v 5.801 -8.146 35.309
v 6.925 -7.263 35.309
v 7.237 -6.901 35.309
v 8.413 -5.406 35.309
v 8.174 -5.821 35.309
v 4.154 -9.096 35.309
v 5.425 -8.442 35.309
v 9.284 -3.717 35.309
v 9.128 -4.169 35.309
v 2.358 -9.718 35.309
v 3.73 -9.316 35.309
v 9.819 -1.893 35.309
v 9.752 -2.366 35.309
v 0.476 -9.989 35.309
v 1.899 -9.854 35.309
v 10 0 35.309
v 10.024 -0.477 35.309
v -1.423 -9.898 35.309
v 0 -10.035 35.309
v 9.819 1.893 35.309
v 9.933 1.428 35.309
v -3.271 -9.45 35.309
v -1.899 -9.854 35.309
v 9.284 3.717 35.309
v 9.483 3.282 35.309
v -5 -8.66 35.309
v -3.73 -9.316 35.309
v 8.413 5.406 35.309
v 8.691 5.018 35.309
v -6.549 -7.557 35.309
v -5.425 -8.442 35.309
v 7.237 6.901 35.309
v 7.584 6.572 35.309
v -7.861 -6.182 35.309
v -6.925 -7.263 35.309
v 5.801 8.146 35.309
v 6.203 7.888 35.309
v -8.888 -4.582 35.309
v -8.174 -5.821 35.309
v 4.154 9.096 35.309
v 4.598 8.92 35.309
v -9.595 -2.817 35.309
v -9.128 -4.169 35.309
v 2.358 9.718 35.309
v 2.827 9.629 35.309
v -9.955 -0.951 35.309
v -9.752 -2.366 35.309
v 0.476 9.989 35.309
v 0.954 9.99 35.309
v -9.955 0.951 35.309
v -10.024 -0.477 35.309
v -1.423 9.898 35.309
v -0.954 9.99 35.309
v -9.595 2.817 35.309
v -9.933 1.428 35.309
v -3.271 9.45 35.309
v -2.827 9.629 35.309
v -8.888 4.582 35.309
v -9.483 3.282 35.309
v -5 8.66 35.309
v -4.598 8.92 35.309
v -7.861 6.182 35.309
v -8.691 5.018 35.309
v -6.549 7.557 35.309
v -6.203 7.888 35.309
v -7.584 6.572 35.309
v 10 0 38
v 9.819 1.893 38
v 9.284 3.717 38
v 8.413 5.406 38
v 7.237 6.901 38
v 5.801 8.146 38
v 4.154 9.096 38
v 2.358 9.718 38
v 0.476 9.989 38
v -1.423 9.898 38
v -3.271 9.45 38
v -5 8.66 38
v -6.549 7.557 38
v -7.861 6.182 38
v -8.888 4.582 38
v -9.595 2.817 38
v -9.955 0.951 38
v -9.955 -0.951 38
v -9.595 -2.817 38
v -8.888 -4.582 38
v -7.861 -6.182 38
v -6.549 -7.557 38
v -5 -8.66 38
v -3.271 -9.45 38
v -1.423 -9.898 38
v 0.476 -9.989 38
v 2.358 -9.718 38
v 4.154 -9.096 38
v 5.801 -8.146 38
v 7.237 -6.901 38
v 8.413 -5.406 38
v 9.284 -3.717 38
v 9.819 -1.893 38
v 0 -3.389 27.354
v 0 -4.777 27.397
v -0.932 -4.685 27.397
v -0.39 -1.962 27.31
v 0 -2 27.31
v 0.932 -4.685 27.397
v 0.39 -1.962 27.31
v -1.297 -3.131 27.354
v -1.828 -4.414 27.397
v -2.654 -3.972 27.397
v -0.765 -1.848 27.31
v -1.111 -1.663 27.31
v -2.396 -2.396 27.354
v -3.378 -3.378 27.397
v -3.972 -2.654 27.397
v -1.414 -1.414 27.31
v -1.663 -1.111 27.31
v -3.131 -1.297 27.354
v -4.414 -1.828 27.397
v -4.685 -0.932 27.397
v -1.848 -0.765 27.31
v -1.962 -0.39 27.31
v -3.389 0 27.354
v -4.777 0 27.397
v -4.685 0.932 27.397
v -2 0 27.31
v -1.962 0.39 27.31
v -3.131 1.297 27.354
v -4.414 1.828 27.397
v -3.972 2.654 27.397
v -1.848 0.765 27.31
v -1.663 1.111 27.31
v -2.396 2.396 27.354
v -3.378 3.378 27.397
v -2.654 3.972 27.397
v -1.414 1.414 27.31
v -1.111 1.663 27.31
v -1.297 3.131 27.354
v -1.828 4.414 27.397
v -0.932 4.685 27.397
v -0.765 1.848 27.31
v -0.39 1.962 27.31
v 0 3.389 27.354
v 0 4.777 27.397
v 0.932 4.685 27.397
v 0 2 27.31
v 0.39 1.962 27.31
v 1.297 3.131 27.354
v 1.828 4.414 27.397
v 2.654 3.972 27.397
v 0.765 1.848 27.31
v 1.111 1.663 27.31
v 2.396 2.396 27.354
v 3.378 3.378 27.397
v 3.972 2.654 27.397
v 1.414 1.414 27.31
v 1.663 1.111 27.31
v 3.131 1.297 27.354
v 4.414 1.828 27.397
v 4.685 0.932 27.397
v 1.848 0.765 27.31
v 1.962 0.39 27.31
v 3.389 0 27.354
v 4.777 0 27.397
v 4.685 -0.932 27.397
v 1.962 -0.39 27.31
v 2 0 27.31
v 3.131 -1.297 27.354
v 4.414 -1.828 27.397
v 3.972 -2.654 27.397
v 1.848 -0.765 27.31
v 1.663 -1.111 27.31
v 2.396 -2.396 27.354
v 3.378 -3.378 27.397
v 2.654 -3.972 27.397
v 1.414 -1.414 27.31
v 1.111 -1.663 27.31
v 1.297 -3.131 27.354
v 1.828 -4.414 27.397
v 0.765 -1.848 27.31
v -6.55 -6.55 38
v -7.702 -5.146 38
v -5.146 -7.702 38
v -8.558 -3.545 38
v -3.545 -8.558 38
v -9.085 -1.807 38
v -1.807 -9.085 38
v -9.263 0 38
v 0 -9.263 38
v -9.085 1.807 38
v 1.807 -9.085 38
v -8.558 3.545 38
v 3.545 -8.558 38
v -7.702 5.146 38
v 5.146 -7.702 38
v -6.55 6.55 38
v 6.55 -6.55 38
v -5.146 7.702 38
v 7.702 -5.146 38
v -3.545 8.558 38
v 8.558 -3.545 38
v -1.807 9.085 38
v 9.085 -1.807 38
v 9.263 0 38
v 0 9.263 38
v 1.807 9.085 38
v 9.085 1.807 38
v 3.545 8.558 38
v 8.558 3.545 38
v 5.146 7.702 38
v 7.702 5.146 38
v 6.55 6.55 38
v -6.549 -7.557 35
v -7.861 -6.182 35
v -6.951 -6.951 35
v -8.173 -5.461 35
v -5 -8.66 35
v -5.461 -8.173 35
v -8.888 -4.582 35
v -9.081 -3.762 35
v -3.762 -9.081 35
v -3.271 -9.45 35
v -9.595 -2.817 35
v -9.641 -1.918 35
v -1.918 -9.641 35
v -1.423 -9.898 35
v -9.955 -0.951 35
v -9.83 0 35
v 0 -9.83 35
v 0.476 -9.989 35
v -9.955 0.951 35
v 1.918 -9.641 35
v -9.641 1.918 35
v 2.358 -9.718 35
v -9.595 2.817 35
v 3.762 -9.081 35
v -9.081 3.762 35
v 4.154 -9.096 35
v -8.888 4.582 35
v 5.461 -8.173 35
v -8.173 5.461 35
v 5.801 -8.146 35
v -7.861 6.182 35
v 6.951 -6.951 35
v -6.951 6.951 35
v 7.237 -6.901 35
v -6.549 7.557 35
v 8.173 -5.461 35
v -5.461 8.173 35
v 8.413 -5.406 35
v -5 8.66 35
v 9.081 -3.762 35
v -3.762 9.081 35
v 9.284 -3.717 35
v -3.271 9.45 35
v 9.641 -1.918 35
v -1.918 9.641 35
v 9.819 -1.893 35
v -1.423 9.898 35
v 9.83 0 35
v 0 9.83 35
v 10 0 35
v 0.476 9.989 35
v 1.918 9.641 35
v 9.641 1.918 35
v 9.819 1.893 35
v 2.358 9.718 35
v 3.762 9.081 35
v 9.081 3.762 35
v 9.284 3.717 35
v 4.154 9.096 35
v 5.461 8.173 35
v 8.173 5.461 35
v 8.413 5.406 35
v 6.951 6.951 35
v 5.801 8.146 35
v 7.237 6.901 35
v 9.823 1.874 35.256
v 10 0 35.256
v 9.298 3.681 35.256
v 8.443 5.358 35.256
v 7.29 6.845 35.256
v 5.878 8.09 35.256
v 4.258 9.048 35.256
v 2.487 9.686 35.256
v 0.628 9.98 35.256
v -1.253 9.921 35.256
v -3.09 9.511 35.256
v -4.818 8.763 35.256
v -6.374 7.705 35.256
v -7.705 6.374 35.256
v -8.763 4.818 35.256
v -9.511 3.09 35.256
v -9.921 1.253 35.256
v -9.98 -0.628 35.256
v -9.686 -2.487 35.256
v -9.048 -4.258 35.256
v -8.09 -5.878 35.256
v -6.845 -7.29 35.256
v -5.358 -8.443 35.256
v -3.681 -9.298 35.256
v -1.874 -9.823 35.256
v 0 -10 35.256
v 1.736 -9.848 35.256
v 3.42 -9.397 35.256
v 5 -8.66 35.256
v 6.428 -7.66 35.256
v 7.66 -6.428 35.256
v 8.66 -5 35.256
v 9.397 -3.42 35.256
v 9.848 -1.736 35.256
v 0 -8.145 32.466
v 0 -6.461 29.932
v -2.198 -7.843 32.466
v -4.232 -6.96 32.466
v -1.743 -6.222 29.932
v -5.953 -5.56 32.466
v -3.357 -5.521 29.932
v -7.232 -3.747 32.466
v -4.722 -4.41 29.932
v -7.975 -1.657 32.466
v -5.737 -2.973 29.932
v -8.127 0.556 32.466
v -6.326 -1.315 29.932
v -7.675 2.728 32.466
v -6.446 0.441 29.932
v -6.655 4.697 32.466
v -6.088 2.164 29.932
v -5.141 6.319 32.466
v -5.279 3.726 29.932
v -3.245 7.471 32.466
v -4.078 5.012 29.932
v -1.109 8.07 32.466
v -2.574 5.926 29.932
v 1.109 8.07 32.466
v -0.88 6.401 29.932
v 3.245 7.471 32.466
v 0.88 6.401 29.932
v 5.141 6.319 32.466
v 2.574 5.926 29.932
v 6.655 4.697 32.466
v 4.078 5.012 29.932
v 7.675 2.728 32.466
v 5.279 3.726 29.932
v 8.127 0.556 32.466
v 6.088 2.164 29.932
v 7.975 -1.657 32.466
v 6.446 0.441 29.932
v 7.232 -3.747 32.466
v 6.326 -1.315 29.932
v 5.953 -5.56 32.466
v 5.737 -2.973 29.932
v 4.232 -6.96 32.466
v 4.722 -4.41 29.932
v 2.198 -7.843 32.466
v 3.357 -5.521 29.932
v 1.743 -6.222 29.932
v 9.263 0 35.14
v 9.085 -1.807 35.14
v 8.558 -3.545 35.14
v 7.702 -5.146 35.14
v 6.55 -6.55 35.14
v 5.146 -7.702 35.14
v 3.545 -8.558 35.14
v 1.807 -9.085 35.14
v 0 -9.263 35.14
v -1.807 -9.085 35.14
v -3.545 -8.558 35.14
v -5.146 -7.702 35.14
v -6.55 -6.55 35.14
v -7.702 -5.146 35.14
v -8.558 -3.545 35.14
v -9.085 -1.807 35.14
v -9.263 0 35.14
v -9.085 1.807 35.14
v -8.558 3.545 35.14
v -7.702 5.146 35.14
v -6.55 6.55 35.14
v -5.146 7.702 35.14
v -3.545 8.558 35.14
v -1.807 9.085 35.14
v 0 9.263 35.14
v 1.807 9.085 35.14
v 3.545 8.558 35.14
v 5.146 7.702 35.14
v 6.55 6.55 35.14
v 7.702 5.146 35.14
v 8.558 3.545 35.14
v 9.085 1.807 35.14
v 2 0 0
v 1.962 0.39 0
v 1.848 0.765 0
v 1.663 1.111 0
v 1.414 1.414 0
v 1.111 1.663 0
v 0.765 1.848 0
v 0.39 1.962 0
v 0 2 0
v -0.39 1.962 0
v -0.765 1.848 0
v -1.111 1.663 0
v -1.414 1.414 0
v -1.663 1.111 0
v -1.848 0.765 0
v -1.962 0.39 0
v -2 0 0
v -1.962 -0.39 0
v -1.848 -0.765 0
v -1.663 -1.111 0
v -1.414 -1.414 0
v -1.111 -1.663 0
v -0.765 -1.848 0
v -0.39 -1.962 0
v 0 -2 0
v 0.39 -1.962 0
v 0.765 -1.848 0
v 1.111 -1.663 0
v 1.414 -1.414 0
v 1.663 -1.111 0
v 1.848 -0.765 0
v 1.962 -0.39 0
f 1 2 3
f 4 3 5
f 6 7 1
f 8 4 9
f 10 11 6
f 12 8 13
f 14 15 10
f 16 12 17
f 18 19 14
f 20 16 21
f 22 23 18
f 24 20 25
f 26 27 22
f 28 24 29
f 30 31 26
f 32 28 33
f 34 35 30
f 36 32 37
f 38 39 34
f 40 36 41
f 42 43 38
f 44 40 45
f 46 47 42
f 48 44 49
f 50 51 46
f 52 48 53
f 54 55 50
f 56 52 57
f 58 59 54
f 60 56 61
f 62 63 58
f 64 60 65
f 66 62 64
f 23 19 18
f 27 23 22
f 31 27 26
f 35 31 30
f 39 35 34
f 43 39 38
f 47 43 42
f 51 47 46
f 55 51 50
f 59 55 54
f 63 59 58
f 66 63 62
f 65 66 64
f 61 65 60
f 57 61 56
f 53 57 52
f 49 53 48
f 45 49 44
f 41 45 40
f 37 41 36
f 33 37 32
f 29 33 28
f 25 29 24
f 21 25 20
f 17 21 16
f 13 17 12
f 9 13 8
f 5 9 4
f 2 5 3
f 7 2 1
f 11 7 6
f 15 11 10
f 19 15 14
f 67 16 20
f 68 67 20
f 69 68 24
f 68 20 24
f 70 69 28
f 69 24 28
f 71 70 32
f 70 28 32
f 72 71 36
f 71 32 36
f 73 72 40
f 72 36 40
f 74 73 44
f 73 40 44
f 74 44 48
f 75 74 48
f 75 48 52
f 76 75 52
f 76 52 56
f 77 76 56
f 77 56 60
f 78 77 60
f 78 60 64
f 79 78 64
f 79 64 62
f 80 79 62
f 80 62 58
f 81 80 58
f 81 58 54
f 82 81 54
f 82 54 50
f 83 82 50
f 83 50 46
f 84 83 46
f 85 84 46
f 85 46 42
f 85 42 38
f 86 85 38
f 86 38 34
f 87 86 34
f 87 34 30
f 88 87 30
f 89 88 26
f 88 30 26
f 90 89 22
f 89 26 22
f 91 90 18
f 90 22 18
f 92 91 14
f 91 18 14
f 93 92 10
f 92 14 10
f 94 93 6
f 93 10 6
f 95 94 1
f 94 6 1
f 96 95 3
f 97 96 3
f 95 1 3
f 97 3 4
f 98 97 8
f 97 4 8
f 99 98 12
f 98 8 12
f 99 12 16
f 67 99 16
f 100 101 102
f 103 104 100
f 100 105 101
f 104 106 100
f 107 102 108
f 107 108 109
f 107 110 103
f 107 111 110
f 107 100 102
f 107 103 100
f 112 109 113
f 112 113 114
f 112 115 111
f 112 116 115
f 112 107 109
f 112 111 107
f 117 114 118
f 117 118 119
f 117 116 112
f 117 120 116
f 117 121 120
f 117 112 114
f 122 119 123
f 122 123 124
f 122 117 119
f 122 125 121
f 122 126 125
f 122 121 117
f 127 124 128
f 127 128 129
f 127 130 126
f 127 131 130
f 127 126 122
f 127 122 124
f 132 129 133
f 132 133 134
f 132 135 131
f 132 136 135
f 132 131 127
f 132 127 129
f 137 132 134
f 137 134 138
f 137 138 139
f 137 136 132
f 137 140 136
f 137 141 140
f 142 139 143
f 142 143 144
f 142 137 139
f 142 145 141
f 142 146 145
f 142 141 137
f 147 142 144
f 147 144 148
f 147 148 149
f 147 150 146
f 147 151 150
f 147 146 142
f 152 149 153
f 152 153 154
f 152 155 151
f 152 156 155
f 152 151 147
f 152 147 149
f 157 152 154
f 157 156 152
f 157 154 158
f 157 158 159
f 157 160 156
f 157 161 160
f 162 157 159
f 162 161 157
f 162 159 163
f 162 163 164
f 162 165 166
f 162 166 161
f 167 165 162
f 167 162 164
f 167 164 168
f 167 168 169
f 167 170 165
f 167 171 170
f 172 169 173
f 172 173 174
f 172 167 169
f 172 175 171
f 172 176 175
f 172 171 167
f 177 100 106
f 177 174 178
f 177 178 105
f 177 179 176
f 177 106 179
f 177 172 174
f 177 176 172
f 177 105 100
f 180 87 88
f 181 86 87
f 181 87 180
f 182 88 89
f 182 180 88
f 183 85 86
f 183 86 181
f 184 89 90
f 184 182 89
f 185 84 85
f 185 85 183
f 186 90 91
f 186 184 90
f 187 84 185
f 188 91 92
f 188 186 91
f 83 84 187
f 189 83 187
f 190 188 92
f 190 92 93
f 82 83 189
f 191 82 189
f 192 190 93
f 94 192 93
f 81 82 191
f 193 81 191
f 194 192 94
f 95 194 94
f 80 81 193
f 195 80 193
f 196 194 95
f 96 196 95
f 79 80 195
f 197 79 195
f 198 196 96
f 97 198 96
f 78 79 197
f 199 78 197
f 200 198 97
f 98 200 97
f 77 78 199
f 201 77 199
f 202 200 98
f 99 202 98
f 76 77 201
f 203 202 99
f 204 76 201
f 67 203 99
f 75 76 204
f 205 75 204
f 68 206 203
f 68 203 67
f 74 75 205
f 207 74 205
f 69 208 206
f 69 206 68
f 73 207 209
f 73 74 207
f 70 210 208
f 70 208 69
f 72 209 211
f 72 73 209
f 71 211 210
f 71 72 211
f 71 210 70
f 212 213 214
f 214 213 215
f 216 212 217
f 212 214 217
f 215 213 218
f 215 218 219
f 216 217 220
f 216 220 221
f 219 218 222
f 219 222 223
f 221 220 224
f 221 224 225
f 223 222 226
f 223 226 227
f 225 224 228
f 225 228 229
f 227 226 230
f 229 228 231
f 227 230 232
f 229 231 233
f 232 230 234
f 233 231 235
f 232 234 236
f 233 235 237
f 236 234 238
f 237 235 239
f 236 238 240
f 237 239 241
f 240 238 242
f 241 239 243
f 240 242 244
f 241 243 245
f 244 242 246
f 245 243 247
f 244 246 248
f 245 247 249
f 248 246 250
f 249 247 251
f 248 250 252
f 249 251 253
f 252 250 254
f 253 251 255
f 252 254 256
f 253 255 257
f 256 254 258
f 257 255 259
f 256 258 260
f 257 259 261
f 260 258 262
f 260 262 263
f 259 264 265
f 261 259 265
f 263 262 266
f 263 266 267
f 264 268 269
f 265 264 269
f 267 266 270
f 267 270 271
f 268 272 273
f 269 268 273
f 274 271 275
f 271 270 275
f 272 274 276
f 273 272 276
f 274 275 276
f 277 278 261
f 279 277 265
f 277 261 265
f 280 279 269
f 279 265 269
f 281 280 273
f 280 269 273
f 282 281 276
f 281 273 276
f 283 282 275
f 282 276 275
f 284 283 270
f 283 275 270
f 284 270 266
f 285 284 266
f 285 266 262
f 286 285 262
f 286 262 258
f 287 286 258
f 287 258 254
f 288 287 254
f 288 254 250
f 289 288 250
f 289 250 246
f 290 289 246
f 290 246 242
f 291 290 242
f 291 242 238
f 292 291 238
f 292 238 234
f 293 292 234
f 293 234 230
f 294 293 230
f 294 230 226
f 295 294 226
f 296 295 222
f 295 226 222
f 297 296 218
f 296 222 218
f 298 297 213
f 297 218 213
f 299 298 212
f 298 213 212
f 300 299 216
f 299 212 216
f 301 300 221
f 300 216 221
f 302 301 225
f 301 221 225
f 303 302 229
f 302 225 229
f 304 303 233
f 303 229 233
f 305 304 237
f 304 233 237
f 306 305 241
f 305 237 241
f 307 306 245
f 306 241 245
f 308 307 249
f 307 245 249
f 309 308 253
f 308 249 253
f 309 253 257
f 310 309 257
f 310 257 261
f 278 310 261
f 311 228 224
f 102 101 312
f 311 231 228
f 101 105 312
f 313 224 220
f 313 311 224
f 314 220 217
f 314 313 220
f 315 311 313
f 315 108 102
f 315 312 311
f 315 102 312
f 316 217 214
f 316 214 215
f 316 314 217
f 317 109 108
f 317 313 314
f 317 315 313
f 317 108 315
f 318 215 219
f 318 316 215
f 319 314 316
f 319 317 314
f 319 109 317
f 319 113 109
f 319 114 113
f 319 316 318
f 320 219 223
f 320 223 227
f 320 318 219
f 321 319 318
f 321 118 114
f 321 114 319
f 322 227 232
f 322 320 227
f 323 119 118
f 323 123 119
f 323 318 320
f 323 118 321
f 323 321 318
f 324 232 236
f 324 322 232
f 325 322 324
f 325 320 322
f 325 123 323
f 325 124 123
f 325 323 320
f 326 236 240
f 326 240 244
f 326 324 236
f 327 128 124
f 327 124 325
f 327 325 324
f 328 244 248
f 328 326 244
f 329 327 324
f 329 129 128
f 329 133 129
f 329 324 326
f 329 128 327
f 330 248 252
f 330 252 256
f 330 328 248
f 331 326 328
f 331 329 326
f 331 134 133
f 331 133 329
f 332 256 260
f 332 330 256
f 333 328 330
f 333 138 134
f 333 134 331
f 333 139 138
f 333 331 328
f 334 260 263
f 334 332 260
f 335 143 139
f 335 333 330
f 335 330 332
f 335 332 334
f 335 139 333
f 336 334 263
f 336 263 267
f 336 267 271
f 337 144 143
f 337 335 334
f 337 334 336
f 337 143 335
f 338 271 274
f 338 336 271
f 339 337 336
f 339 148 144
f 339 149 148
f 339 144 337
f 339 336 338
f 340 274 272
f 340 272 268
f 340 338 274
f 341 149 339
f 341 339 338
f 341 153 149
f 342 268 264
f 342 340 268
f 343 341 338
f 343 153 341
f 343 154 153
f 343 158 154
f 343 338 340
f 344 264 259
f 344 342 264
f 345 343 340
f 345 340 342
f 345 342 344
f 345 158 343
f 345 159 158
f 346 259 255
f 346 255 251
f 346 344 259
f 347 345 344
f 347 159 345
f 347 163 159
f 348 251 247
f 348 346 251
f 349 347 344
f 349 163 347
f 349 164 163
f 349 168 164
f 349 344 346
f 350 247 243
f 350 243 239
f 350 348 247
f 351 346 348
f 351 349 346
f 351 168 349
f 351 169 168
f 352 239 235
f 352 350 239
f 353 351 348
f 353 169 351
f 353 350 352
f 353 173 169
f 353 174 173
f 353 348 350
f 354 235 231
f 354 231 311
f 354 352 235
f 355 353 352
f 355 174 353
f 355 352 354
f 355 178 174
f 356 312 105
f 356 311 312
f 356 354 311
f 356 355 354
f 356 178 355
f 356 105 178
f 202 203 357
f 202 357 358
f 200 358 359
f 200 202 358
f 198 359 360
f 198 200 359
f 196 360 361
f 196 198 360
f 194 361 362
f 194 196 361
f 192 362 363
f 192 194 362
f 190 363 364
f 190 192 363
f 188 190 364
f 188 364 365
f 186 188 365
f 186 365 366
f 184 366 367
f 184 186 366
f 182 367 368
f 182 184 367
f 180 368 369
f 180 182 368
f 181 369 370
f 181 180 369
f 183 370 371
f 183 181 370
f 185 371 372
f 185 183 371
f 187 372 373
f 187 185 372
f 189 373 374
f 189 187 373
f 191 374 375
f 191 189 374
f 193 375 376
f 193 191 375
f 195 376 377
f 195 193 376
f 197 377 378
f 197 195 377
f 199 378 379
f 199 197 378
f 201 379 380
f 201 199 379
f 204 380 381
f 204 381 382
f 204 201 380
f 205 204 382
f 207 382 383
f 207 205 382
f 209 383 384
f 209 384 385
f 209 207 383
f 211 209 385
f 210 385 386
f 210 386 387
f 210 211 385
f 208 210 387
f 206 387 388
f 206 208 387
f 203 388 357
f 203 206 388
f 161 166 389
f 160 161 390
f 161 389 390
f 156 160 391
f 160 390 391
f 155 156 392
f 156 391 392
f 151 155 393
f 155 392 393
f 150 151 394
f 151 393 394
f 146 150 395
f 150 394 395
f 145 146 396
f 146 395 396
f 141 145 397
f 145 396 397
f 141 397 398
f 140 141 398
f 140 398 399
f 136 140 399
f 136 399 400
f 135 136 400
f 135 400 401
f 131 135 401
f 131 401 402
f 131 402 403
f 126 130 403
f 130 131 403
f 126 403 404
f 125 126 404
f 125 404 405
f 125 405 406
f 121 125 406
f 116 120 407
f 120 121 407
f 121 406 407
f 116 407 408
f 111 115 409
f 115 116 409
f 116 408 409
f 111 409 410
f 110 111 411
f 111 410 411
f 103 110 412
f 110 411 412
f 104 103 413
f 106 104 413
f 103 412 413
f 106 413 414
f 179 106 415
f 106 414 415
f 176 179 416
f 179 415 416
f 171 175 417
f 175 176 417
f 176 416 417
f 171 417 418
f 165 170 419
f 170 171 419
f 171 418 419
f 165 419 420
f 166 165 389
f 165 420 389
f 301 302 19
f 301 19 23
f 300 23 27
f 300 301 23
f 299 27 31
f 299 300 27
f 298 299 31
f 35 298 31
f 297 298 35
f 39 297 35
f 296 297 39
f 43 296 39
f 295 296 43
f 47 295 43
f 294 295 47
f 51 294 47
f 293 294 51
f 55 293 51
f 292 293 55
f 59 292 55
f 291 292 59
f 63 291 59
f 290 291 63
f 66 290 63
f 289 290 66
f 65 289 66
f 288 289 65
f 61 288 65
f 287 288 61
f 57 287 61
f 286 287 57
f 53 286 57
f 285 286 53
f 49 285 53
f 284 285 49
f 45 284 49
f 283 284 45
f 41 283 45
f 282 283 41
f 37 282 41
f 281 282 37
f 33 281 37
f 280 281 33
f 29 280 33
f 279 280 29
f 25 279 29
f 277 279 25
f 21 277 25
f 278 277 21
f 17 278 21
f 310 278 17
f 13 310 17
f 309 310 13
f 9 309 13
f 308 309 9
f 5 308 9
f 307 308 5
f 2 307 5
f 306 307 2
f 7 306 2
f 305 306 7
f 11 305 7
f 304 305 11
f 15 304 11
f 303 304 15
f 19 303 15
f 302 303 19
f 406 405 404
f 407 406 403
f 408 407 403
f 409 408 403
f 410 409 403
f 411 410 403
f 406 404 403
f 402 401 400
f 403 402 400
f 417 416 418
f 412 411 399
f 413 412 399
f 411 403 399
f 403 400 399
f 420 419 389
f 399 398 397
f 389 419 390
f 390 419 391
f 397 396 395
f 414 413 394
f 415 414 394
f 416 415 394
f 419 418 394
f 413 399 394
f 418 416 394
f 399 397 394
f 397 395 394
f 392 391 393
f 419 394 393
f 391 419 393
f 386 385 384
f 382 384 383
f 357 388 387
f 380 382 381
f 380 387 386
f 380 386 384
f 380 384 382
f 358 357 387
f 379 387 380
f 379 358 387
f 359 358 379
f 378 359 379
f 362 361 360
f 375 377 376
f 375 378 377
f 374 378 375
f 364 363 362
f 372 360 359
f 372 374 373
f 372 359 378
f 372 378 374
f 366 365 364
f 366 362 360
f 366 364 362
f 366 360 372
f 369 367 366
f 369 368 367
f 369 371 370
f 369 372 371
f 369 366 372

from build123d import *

# Parameters (mm, degrees)
F0_R     = 2
F1_DEPTH = 35
F2_R     = 10
F3_DEPTH = 3


with BuildPart() as f1:
    # F0 (on Top) → F1 (new body)
    with BuildSketch(Plane.XY):
        Circle(F0_R)
    extrude(amount=F1_DEPTH)

    # F2 (on face) → F3 (join)
    with BuildSketch(Plane.XY.offset(35)):
        Circle(F2_R)
    extrude(amount=F3_DEPTH)

    # F5 (on Right) → F6 (revolve)
    with BuildSketch(Plane.YZ):
        Polygon((0, 31.303294), (0, 35.309382), (-10.035225, 35.309382), (-4.777231, 27.397355), (0, 27.247125), align=None)
    revolve(axis=Axis((0, 0, 31.278254), (0, 0, -1)))

    # F7 (on Front) → F8 (revolve, cut)
    with BuildSketch(Plane.XZ):
        Polygon((9.262677, 40.559426), (0, 38.892001), (0, 35.140295), (9.262677, 35.140295), align=None)
    revolve(axis=Axis((0, 0, 37.016148), (0, 0, -1)), mode=Mode.SUBTRACT)


solid = f1.part
